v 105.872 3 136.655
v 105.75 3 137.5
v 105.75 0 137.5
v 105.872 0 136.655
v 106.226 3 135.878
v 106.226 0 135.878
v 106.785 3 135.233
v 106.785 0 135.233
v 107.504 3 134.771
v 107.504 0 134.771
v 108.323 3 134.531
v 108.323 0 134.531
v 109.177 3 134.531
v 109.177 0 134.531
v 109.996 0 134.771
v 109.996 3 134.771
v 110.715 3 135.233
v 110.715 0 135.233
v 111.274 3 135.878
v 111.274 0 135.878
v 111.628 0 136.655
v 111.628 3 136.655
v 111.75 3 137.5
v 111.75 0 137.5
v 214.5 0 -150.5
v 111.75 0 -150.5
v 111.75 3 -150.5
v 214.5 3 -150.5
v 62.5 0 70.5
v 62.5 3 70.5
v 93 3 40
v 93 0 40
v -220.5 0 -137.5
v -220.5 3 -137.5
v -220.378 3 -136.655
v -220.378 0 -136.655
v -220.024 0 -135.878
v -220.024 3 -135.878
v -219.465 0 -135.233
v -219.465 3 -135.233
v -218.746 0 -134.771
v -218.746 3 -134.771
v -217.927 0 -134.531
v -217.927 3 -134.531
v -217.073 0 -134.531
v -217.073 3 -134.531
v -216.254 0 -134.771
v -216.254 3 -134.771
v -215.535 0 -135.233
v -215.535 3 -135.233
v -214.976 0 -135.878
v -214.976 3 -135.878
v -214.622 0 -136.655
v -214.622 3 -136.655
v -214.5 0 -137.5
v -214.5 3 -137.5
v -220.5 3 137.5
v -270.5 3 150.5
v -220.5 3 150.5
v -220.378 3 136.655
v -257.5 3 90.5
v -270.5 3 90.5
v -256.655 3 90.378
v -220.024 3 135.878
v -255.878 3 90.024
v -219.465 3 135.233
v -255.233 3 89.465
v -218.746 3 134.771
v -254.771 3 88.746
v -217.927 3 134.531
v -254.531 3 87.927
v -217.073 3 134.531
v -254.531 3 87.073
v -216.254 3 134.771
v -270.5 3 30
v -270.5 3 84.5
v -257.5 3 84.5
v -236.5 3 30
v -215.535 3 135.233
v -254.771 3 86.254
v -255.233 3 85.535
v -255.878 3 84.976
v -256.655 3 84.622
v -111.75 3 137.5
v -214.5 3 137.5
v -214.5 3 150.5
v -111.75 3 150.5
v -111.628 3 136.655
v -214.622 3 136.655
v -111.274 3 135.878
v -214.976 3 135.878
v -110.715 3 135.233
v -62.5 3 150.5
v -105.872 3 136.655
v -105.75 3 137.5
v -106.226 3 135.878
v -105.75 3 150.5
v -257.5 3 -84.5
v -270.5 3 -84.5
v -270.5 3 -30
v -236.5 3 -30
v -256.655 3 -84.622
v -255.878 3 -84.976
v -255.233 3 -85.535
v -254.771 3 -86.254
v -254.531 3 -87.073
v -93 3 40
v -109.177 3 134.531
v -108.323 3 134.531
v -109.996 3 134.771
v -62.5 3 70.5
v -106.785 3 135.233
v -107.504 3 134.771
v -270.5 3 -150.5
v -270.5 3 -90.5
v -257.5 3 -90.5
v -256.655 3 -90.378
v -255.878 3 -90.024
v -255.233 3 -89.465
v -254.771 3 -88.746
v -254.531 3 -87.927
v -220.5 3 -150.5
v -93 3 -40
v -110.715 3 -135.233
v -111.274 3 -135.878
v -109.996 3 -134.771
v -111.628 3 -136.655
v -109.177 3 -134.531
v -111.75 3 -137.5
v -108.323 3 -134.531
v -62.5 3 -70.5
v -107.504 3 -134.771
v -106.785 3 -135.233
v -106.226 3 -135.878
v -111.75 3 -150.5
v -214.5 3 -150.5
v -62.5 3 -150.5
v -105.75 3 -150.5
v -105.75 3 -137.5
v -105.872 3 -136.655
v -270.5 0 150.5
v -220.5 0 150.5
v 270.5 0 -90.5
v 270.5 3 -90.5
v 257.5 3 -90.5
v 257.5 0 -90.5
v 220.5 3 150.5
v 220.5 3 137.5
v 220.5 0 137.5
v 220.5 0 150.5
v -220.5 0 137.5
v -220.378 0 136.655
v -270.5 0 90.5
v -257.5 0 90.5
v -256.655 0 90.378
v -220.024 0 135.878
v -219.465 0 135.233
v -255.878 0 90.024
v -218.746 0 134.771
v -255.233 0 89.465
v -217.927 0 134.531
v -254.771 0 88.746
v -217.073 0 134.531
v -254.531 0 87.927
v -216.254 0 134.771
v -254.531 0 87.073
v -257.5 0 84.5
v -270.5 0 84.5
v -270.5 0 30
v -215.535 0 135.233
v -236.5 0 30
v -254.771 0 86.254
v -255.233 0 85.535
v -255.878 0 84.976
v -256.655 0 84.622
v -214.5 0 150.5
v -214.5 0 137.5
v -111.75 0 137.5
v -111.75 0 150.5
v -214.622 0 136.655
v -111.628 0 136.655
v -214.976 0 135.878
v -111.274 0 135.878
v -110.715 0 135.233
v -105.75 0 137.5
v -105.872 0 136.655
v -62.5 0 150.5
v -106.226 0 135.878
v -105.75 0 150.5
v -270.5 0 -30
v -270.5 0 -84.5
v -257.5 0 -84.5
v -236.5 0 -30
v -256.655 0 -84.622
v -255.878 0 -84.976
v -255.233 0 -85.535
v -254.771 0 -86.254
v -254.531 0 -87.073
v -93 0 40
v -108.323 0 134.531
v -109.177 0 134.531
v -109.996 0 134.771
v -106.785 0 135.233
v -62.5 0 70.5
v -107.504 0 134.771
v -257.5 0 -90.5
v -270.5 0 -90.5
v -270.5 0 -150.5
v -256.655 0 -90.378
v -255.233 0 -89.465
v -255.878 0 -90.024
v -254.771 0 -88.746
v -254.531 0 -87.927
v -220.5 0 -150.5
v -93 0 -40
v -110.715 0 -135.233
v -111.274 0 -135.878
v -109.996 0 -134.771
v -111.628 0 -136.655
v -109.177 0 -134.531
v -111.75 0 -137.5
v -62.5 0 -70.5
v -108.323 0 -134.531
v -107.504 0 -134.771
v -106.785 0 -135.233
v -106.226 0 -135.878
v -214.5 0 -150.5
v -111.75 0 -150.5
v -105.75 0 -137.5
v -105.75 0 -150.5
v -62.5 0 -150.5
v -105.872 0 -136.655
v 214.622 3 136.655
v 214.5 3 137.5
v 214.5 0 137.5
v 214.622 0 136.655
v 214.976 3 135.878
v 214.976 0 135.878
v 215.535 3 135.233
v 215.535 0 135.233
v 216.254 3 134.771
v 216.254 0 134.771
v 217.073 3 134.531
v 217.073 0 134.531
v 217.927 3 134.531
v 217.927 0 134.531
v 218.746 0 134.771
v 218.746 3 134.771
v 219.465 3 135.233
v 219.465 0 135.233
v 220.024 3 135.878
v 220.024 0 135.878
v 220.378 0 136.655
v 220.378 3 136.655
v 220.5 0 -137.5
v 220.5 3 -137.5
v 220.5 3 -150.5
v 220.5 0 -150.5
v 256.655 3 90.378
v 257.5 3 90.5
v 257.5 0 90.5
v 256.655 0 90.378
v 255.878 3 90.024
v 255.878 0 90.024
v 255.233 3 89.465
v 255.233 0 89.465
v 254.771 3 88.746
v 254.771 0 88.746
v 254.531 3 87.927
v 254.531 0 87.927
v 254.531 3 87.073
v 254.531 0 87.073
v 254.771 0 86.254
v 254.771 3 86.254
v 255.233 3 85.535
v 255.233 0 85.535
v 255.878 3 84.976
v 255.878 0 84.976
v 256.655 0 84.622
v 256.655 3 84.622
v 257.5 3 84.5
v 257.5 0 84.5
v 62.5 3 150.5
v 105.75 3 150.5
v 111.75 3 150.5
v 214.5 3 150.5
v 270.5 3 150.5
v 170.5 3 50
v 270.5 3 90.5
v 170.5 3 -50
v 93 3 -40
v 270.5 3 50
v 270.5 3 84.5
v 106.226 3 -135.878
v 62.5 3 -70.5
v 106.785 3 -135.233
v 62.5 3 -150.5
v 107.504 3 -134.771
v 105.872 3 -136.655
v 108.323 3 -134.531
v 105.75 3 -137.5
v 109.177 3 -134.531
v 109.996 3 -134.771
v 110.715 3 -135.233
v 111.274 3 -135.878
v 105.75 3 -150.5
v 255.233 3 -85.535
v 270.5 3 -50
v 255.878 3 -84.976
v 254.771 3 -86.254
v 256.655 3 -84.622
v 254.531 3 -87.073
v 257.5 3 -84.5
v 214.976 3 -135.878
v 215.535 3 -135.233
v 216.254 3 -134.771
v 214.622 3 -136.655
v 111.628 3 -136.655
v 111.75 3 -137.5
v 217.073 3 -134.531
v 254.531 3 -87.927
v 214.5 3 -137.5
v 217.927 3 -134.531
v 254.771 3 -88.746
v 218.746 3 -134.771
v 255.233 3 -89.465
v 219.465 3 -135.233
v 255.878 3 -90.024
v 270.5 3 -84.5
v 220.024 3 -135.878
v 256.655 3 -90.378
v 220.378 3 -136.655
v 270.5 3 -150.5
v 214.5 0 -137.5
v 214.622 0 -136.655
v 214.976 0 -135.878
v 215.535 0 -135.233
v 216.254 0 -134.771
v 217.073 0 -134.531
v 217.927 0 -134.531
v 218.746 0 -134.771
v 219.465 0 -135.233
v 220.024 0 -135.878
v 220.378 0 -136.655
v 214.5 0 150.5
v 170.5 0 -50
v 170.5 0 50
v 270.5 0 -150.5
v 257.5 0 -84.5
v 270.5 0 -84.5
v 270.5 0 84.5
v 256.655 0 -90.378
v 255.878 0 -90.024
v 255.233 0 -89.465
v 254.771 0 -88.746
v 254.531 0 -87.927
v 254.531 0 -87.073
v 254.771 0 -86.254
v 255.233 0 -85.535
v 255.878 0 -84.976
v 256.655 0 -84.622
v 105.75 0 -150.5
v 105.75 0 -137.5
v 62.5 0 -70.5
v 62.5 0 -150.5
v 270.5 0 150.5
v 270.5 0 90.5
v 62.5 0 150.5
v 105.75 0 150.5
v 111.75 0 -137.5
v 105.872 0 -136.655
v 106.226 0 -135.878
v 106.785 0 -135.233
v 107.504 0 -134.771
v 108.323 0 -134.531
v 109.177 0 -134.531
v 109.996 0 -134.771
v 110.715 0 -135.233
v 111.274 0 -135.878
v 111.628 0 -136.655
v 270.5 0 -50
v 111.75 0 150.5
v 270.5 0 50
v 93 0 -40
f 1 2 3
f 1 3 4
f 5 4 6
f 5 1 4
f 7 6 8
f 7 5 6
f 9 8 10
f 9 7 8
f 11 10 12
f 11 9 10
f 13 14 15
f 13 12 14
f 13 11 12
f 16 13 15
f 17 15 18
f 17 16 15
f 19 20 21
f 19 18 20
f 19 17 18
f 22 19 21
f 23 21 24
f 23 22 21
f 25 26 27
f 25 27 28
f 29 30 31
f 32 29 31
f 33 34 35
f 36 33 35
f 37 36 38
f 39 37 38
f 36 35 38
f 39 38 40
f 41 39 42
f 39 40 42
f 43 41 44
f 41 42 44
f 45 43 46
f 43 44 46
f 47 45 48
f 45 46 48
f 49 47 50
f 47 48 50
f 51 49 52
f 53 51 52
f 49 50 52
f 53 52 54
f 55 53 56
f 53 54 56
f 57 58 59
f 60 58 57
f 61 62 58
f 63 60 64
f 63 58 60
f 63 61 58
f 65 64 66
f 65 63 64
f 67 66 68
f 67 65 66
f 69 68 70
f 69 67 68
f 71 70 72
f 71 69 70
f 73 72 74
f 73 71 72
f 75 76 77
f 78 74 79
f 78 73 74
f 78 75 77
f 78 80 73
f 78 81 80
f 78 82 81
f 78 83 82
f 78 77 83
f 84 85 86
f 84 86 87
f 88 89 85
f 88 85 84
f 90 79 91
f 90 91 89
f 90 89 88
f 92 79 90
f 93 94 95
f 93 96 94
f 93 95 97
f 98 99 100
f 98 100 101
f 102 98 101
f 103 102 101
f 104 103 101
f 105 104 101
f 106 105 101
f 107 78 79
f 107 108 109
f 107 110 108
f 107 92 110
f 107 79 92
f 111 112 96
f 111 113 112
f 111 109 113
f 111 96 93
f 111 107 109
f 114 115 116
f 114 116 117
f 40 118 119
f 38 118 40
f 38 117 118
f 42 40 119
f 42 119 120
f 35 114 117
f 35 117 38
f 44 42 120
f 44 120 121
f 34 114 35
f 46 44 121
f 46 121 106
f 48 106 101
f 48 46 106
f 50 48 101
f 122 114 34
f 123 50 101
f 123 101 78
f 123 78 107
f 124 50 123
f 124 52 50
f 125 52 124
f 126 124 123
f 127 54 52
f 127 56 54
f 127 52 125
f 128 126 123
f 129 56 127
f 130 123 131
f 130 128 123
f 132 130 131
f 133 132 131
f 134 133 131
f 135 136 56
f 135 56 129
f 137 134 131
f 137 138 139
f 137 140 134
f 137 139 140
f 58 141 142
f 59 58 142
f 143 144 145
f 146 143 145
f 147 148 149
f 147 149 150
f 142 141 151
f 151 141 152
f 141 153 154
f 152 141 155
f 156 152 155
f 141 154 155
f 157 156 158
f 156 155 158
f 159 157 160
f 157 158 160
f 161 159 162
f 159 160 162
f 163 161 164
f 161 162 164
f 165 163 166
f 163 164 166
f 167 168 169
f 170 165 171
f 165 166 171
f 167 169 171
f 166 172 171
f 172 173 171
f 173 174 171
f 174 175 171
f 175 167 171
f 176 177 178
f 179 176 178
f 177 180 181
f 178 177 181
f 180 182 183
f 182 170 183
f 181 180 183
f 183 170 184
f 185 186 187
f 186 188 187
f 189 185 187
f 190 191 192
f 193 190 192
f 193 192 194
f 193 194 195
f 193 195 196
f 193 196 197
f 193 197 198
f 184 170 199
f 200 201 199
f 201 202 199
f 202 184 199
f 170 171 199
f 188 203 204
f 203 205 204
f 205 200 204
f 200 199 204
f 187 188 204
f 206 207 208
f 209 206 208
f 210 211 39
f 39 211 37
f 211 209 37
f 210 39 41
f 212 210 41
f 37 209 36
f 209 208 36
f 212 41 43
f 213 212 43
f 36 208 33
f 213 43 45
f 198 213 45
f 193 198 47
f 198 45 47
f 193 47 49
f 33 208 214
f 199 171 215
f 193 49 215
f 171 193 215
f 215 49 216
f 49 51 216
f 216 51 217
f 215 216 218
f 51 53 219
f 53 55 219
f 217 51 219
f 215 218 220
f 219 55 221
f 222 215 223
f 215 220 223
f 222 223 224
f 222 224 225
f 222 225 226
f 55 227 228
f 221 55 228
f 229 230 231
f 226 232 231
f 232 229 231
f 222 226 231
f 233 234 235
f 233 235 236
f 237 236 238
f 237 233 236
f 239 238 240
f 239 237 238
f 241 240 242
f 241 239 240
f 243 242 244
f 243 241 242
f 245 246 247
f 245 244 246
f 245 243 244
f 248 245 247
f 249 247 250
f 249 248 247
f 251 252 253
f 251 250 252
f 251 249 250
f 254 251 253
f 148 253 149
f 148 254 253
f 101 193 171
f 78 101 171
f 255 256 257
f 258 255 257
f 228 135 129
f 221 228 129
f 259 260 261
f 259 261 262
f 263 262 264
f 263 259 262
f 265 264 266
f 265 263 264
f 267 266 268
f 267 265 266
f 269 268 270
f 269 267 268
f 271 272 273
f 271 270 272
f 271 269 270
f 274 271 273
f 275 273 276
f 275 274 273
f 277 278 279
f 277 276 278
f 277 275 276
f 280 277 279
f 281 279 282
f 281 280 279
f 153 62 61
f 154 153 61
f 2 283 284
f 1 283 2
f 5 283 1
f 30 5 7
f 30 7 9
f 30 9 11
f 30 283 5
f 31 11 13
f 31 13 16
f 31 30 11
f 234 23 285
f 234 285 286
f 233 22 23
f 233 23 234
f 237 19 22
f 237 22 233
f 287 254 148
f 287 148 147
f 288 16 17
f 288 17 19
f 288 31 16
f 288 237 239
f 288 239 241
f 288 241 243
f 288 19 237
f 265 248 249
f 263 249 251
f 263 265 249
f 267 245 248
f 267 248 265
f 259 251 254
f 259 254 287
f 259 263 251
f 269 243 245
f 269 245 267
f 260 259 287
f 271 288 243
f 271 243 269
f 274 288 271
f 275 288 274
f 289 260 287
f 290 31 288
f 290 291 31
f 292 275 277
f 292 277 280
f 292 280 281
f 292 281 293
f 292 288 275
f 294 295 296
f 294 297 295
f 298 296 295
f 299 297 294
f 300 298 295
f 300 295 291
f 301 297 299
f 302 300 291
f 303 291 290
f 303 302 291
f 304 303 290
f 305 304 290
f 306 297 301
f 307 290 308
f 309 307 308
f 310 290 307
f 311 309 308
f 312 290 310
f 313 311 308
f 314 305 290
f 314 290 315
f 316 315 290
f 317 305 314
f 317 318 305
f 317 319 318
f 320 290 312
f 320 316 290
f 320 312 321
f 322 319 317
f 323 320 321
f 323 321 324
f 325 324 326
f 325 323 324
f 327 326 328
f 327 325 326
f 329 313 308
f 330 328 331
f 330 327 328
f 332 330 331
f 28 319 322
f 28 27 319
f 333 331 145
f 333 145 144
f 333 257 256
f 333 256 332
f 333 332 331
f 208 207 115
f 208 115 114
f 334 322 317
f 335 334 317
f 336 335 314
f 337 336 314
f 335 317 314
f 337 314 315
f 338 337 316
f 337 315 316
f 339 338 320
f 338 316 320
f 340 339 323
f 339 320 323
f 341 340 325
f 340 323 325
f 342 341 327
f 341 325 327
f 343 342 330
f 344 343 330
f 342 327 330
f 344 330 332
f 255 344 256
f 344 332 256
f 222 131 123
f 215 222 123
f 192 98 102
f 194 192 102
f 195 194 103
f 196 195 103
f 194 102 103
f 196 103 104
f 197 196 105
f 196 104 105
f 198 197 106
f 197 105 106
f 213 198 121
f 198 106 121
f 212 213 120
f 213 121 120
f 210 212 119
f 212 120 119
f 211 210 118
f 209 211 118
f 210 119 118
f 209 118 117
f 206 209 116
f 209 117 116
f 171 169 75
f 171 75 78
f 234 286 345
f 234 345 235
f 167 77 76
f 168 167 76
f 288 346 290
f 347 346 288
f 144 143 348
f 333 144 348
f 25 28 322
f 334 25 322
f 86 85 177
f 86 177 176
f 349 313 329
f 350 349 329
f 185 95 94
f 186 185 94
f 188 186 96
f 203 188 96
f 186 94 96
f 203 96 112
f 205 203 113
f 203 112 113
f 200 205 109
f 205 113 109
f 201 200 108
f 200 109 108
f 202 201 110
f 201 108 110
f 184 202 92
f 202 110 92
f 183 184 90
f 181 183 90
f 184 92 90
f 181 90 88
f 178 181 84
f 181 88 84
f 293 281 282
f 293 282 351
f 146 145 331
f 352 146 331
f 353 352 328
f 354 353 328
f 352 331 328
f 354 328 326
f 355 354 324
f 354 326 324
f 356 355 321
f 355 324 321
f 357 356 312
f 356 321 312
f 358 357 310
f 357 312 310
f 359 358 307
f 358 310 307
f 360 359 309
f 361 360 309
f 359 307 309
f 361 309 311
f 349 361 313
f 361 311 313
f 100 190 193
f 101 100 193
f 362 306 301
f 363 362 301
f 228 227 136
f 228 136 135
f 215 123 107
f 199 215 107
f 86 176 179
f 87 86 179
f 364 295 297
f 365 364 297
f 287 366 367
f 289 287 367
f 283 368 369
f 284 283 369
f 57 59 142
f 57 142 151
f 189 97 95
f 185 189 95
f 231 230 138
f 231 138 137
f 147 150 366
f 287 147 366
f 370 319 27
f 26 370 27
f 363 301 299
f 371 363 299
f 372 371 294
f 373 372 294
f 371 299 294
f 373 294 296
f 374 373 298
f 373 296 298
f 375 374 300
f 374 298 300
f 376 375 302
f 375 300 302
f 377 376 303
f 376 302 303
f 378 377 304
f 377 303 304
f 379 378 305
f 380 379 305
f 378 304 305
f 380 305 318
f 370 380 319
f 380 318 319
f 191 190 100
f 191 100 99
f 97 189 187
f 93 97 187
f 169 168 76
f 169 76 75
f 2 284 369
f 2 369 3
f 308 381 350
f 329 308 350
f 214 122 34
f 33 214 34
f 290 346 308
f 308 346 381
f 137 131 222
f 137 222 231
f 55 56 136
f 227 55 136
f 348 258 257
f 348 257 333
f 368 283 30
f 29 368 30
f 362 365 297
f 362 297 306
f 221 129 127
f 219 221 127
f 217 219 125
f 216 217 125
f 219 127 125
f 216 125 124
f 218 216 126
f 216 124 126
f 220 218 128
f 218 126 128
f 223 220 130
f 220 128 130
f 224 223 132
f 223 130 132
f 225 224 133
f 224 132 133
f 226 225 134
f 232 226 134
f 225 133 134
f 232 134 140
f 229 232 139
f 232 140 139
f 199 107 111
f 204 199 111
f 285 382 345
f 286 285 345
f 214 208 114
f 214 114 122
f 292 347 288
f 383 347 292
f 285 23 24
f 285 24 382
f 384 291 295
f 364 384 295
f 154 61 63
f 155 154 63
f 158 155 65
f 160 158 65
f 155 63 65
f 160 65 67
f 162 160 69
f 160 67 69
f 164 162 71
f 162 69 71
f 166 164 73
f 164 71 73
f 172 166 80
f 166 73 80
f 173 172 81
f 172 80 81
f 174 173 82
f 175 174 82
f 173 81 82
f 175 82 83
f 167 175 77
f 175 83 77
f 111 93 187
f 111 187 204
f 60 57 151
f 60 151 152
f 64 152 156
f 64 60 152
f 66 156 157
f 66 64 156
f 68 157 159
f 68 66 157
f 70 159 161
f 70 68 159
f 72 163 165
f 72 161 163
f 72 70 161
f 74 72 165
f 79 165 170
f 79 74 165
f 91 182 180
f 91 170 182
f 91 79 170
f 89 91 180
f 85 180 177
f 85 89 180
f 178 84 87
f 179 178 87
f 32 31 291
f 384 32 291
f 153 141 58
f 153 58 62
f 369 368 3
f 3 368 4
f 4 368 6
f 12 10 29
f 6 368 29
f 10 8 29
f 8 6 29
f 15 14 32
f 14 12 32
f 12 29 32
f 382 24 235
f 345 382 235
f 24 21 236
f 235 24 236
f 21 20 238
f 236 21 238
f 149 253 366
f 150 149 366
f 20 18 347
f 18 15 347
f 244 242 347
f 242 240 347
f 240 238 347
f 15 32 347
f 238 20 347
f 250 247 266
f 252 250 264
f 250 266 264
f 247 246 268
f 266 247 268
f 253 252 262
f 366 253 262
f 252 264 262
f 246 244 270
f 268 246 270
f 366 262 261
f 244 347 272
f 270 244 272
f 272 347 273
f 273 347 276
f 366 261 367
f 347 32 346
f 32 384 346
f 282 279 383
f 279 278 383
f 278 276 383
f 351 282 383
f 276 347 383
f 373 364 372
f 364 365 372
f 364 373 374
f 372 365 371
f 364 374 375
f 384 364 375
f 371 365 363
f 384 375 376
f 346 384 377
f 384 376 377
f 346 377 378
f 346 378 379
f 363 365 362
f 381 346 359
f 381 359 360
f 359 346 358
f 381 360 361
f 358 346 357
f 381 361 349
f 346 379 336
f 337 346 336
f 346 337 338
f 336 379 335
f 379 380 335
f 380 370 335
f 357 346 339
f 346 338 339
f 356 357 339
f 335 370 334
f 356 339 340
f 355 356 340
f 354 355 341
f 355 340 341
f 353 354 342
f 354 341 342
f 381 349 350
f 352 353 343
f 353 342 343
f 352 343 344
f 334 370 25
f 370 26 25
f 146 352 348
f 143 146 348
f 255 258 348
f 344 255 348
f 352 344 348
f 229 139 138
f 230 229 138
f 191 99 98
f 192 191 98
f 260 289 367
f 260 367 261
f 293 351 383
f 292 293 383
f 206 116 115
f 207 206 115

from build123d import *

# Parameters (mm, degrees)
SKETCH1_W           = 541
SKETCH1_H           = 301
BOSS_EXTRUDE1_DEPTH = 3
SKETCH2_W           = 34
SKETCH2_H           = 60
CUT_EXTRUDE1_DEPTH  = 10
SKETCH3_W           = 200
SKETCH3_H           = 100
CUT_EXTRUDE2_DEPTH  = 5
SKETCH4_W           = 125
SKETCH4_H           = 301
CUT_EXTRUDE3_DEPTH  = 5
CUT_EXTRUDE4_DEPTH  = 10
CUT_EXTRUDE5_DEPTH  = 10


with BuildPart() as part:
    # Sketch1 → Boss-Extrude1 (new body)
    with BuildSketch(Plane(origin=(0, 0, 0), x_dir=(1, 0, 0), z_dir=(0, 1, 0))):
        Rectangle(SKETCH1_W, SKETCH1_H)
    extrude(amount=BOSS_EXTRUDE1_DEPTH)

    # Sketch2 → Cut-Extrude1 (cut)
    with BuildSketch(Plane.XZ):
        with Locations((-253.5, 0)):
            Rectangle(SKETCH2_W, SKETCH2_H)
    extrude(amount=-CUT_EXTRUDE1_DEPTH, mode=Mode.SUBTRACT)

    # Sketch3 → Cut-Extrude2 (cut)
    with BuildSketch(Plane.XZ):
        with Locations((270.5, 0)):
            Rectangle(SKETCH3_W, SKETCH3_H)
    extrude(amount=-CUT_EXTRUDE2_DEPTH, mode=Mode.SUBTRACT)

    # Sketch4 → Cut-Extrude3 (cut)
    with BuildSketch(Plane(origin=(0, 3, 0), x_dir=(1, 0, 0), z_dir=(0, 1, 0))):
        Rectangle(SKETCH4_W, SKETCH4_H)
    extrude(amount=-CUT_EXTRUDE3_DEPTH, mode=Mode.SUBTRACT)

    # Sketch5 → Cut-Extrude4 (cut)
    with BuildSketch(Plane(origin=(0, 3, 0), x_dir=(1, 0, 0), z_dir=(0, 1, 0))):
        with BuildLine():
            Line((-270.5, -84.5), (-270.5, -90.5))
            Line((-270.5, -90.5), (-257.5, -90.5))
            ThreePointArc((-257.5, -90.5), (-254.5, -87.5), (-257.5, -84.5))
            Line((-257.5, -84.5), (-270.5, -84.5))
        make_face()
        with BuildLine():
            Line((-111.75, -150.5), (-105.75, -150.5))
            Line((-105.75, -150.5), (-105.75, -137.5))
            ThreePointArc((-105.75, -137.5), (-108.75, -134.5), (-111.75, -137.5))
            Line((-111.75, -137.5), (-111.75, -150.5))
        make_face()
        with BuildLine():
            Line((-257.5, 90.5), (-270.5, 90.5))
            Line((-270.5, 90.5), (-270.5, 84.5))
            Line((-270.5, 84.5), (-257.5, 84.5))
            ThreePointArc((-257.5, 84.5), (-254.5, 87.5), (-257.5, 90.5))
        make_face()
        with BuildLine():
            Line((-214.5, 150.5), (-220.5, 150.5))
            Line((-220.5, 150.5), (-220.5, 137.5))
            ThreePointArc((-220.5, 137.5), (-217.5, 134.5), (-214.5, 137.5))
            Line((-214.5, 137.5), (-214.5, 150.5))
        make_face()
        with BuildLine():
            Line((105.75, 150.5), (105.75, 137.5))
            ThreePointArc((105.75, 137.5), (108.75, 134.5), (111.75, 137.5))
            Line((111.75, 137.5), (111.75, 150.5))
            Line((111.75, 150.5), (105.75, 150.5))
        make_face()
        with BuildLine():
            Line((214.5, 150.5), (214.5, 137.5))
            ThreePointArc((214.5, 137.5), (217.5, 134.5), (220.5, 137.5))
            Line((220.5, 137.5), (220.5, 150.5))
            Line((220.5, 150.5), (214.5, 150.5))
        make_face()
        with BuildLine():
            Line((270.5, 90.5), (257.5, 90.5))
            ThreePointArc((257.5, 90.5), (254.5, 87.5), (257.5, 84.5))
            Line((257.5, 84.5), (270.5, 84.5))
            Line((270.5, 84.5), (270.5, 90.5))
        make_face()
        with BuildLine():
            ThreePointArc((257.5, -90.5), (254.5, -87.5), (257.5, -84.5))
            Line((257.5, -84.5), (270.5, -84.5))
            Line((270.5, -84.5), (270.5, -90.5))
            Line((270.5, -90.5), (257.5, -90.5))
        make_face()
        with BuildLine():
            ThreePointArc((214.5, -137.5), (217.5, -134.5), (220.5, -137.5))
            Line((220.5, -137.5), (220.5, -150.5))
            Line((220.5, -150.5), (214.5, -150.5))
            Line((214.5, -150.5), (214.5, -137.5))
        make_face()
        with BuildLine():
            ThreePointArc((105.75, -137.5), (108.75, -134.5), (111.75, -137.5))
            Line((111.75, -137.5), (111.75, -150.5))
            Line((111.75, -150.5), (105.75, -150.5))
            Line((105.75, -150.5), (105.75, -137.5))
        make_face()
        with BuildLine():
            Line((-214.5, -137.5), (-214.5, -150.5))
            Line((-214.5, -150.5), (-220.5, -150.5))
            Line((-220.5, -150.5), (-220.5, -137.5))
            ThreePointArc((-220.5, -137.5), (-217.5, -134.5), (-214.5, -137.5))
        make_face()
        with BuildLine():
            Line((-105.75, 137.5), (-105.75, 150.5))
            Line((-105.75, 150.5), (-111.75, 150.5))
            Line((-111.75, 150.5), (-111.75, 137.5))
            ThreePointArc((-111.75, 137.5), (-108.75, 134.5), (-105.75, 137.5))
        make_face()
    extrude(amount=-CUT_EXTRUDE4_DEPTH, mode=Mode.SUBTRACT)

    # Sketch6 → Cut-Extrude5 (cut)
    with BuildSketch(Plane(origin=(0, 3, 0), x_dir=(1, 0, 0), z_dir=(0, 1, 0))):
        Polygon((62.5, 150.5), (-62.5, 150.5), (-62.5, 70.5), (-93, 40), (-93, -40), (-62.5, -70.5), (-62.5, -150.5), (62.5, -150.5), (62.5, -70.5), (93, -40), (93, 40), (62.5, 70.5), align=None)
    extrude(amount=-CUT_EXTRUDE5_DEPTH, mode=Mode.SUBTRACT)


solid = part.part
